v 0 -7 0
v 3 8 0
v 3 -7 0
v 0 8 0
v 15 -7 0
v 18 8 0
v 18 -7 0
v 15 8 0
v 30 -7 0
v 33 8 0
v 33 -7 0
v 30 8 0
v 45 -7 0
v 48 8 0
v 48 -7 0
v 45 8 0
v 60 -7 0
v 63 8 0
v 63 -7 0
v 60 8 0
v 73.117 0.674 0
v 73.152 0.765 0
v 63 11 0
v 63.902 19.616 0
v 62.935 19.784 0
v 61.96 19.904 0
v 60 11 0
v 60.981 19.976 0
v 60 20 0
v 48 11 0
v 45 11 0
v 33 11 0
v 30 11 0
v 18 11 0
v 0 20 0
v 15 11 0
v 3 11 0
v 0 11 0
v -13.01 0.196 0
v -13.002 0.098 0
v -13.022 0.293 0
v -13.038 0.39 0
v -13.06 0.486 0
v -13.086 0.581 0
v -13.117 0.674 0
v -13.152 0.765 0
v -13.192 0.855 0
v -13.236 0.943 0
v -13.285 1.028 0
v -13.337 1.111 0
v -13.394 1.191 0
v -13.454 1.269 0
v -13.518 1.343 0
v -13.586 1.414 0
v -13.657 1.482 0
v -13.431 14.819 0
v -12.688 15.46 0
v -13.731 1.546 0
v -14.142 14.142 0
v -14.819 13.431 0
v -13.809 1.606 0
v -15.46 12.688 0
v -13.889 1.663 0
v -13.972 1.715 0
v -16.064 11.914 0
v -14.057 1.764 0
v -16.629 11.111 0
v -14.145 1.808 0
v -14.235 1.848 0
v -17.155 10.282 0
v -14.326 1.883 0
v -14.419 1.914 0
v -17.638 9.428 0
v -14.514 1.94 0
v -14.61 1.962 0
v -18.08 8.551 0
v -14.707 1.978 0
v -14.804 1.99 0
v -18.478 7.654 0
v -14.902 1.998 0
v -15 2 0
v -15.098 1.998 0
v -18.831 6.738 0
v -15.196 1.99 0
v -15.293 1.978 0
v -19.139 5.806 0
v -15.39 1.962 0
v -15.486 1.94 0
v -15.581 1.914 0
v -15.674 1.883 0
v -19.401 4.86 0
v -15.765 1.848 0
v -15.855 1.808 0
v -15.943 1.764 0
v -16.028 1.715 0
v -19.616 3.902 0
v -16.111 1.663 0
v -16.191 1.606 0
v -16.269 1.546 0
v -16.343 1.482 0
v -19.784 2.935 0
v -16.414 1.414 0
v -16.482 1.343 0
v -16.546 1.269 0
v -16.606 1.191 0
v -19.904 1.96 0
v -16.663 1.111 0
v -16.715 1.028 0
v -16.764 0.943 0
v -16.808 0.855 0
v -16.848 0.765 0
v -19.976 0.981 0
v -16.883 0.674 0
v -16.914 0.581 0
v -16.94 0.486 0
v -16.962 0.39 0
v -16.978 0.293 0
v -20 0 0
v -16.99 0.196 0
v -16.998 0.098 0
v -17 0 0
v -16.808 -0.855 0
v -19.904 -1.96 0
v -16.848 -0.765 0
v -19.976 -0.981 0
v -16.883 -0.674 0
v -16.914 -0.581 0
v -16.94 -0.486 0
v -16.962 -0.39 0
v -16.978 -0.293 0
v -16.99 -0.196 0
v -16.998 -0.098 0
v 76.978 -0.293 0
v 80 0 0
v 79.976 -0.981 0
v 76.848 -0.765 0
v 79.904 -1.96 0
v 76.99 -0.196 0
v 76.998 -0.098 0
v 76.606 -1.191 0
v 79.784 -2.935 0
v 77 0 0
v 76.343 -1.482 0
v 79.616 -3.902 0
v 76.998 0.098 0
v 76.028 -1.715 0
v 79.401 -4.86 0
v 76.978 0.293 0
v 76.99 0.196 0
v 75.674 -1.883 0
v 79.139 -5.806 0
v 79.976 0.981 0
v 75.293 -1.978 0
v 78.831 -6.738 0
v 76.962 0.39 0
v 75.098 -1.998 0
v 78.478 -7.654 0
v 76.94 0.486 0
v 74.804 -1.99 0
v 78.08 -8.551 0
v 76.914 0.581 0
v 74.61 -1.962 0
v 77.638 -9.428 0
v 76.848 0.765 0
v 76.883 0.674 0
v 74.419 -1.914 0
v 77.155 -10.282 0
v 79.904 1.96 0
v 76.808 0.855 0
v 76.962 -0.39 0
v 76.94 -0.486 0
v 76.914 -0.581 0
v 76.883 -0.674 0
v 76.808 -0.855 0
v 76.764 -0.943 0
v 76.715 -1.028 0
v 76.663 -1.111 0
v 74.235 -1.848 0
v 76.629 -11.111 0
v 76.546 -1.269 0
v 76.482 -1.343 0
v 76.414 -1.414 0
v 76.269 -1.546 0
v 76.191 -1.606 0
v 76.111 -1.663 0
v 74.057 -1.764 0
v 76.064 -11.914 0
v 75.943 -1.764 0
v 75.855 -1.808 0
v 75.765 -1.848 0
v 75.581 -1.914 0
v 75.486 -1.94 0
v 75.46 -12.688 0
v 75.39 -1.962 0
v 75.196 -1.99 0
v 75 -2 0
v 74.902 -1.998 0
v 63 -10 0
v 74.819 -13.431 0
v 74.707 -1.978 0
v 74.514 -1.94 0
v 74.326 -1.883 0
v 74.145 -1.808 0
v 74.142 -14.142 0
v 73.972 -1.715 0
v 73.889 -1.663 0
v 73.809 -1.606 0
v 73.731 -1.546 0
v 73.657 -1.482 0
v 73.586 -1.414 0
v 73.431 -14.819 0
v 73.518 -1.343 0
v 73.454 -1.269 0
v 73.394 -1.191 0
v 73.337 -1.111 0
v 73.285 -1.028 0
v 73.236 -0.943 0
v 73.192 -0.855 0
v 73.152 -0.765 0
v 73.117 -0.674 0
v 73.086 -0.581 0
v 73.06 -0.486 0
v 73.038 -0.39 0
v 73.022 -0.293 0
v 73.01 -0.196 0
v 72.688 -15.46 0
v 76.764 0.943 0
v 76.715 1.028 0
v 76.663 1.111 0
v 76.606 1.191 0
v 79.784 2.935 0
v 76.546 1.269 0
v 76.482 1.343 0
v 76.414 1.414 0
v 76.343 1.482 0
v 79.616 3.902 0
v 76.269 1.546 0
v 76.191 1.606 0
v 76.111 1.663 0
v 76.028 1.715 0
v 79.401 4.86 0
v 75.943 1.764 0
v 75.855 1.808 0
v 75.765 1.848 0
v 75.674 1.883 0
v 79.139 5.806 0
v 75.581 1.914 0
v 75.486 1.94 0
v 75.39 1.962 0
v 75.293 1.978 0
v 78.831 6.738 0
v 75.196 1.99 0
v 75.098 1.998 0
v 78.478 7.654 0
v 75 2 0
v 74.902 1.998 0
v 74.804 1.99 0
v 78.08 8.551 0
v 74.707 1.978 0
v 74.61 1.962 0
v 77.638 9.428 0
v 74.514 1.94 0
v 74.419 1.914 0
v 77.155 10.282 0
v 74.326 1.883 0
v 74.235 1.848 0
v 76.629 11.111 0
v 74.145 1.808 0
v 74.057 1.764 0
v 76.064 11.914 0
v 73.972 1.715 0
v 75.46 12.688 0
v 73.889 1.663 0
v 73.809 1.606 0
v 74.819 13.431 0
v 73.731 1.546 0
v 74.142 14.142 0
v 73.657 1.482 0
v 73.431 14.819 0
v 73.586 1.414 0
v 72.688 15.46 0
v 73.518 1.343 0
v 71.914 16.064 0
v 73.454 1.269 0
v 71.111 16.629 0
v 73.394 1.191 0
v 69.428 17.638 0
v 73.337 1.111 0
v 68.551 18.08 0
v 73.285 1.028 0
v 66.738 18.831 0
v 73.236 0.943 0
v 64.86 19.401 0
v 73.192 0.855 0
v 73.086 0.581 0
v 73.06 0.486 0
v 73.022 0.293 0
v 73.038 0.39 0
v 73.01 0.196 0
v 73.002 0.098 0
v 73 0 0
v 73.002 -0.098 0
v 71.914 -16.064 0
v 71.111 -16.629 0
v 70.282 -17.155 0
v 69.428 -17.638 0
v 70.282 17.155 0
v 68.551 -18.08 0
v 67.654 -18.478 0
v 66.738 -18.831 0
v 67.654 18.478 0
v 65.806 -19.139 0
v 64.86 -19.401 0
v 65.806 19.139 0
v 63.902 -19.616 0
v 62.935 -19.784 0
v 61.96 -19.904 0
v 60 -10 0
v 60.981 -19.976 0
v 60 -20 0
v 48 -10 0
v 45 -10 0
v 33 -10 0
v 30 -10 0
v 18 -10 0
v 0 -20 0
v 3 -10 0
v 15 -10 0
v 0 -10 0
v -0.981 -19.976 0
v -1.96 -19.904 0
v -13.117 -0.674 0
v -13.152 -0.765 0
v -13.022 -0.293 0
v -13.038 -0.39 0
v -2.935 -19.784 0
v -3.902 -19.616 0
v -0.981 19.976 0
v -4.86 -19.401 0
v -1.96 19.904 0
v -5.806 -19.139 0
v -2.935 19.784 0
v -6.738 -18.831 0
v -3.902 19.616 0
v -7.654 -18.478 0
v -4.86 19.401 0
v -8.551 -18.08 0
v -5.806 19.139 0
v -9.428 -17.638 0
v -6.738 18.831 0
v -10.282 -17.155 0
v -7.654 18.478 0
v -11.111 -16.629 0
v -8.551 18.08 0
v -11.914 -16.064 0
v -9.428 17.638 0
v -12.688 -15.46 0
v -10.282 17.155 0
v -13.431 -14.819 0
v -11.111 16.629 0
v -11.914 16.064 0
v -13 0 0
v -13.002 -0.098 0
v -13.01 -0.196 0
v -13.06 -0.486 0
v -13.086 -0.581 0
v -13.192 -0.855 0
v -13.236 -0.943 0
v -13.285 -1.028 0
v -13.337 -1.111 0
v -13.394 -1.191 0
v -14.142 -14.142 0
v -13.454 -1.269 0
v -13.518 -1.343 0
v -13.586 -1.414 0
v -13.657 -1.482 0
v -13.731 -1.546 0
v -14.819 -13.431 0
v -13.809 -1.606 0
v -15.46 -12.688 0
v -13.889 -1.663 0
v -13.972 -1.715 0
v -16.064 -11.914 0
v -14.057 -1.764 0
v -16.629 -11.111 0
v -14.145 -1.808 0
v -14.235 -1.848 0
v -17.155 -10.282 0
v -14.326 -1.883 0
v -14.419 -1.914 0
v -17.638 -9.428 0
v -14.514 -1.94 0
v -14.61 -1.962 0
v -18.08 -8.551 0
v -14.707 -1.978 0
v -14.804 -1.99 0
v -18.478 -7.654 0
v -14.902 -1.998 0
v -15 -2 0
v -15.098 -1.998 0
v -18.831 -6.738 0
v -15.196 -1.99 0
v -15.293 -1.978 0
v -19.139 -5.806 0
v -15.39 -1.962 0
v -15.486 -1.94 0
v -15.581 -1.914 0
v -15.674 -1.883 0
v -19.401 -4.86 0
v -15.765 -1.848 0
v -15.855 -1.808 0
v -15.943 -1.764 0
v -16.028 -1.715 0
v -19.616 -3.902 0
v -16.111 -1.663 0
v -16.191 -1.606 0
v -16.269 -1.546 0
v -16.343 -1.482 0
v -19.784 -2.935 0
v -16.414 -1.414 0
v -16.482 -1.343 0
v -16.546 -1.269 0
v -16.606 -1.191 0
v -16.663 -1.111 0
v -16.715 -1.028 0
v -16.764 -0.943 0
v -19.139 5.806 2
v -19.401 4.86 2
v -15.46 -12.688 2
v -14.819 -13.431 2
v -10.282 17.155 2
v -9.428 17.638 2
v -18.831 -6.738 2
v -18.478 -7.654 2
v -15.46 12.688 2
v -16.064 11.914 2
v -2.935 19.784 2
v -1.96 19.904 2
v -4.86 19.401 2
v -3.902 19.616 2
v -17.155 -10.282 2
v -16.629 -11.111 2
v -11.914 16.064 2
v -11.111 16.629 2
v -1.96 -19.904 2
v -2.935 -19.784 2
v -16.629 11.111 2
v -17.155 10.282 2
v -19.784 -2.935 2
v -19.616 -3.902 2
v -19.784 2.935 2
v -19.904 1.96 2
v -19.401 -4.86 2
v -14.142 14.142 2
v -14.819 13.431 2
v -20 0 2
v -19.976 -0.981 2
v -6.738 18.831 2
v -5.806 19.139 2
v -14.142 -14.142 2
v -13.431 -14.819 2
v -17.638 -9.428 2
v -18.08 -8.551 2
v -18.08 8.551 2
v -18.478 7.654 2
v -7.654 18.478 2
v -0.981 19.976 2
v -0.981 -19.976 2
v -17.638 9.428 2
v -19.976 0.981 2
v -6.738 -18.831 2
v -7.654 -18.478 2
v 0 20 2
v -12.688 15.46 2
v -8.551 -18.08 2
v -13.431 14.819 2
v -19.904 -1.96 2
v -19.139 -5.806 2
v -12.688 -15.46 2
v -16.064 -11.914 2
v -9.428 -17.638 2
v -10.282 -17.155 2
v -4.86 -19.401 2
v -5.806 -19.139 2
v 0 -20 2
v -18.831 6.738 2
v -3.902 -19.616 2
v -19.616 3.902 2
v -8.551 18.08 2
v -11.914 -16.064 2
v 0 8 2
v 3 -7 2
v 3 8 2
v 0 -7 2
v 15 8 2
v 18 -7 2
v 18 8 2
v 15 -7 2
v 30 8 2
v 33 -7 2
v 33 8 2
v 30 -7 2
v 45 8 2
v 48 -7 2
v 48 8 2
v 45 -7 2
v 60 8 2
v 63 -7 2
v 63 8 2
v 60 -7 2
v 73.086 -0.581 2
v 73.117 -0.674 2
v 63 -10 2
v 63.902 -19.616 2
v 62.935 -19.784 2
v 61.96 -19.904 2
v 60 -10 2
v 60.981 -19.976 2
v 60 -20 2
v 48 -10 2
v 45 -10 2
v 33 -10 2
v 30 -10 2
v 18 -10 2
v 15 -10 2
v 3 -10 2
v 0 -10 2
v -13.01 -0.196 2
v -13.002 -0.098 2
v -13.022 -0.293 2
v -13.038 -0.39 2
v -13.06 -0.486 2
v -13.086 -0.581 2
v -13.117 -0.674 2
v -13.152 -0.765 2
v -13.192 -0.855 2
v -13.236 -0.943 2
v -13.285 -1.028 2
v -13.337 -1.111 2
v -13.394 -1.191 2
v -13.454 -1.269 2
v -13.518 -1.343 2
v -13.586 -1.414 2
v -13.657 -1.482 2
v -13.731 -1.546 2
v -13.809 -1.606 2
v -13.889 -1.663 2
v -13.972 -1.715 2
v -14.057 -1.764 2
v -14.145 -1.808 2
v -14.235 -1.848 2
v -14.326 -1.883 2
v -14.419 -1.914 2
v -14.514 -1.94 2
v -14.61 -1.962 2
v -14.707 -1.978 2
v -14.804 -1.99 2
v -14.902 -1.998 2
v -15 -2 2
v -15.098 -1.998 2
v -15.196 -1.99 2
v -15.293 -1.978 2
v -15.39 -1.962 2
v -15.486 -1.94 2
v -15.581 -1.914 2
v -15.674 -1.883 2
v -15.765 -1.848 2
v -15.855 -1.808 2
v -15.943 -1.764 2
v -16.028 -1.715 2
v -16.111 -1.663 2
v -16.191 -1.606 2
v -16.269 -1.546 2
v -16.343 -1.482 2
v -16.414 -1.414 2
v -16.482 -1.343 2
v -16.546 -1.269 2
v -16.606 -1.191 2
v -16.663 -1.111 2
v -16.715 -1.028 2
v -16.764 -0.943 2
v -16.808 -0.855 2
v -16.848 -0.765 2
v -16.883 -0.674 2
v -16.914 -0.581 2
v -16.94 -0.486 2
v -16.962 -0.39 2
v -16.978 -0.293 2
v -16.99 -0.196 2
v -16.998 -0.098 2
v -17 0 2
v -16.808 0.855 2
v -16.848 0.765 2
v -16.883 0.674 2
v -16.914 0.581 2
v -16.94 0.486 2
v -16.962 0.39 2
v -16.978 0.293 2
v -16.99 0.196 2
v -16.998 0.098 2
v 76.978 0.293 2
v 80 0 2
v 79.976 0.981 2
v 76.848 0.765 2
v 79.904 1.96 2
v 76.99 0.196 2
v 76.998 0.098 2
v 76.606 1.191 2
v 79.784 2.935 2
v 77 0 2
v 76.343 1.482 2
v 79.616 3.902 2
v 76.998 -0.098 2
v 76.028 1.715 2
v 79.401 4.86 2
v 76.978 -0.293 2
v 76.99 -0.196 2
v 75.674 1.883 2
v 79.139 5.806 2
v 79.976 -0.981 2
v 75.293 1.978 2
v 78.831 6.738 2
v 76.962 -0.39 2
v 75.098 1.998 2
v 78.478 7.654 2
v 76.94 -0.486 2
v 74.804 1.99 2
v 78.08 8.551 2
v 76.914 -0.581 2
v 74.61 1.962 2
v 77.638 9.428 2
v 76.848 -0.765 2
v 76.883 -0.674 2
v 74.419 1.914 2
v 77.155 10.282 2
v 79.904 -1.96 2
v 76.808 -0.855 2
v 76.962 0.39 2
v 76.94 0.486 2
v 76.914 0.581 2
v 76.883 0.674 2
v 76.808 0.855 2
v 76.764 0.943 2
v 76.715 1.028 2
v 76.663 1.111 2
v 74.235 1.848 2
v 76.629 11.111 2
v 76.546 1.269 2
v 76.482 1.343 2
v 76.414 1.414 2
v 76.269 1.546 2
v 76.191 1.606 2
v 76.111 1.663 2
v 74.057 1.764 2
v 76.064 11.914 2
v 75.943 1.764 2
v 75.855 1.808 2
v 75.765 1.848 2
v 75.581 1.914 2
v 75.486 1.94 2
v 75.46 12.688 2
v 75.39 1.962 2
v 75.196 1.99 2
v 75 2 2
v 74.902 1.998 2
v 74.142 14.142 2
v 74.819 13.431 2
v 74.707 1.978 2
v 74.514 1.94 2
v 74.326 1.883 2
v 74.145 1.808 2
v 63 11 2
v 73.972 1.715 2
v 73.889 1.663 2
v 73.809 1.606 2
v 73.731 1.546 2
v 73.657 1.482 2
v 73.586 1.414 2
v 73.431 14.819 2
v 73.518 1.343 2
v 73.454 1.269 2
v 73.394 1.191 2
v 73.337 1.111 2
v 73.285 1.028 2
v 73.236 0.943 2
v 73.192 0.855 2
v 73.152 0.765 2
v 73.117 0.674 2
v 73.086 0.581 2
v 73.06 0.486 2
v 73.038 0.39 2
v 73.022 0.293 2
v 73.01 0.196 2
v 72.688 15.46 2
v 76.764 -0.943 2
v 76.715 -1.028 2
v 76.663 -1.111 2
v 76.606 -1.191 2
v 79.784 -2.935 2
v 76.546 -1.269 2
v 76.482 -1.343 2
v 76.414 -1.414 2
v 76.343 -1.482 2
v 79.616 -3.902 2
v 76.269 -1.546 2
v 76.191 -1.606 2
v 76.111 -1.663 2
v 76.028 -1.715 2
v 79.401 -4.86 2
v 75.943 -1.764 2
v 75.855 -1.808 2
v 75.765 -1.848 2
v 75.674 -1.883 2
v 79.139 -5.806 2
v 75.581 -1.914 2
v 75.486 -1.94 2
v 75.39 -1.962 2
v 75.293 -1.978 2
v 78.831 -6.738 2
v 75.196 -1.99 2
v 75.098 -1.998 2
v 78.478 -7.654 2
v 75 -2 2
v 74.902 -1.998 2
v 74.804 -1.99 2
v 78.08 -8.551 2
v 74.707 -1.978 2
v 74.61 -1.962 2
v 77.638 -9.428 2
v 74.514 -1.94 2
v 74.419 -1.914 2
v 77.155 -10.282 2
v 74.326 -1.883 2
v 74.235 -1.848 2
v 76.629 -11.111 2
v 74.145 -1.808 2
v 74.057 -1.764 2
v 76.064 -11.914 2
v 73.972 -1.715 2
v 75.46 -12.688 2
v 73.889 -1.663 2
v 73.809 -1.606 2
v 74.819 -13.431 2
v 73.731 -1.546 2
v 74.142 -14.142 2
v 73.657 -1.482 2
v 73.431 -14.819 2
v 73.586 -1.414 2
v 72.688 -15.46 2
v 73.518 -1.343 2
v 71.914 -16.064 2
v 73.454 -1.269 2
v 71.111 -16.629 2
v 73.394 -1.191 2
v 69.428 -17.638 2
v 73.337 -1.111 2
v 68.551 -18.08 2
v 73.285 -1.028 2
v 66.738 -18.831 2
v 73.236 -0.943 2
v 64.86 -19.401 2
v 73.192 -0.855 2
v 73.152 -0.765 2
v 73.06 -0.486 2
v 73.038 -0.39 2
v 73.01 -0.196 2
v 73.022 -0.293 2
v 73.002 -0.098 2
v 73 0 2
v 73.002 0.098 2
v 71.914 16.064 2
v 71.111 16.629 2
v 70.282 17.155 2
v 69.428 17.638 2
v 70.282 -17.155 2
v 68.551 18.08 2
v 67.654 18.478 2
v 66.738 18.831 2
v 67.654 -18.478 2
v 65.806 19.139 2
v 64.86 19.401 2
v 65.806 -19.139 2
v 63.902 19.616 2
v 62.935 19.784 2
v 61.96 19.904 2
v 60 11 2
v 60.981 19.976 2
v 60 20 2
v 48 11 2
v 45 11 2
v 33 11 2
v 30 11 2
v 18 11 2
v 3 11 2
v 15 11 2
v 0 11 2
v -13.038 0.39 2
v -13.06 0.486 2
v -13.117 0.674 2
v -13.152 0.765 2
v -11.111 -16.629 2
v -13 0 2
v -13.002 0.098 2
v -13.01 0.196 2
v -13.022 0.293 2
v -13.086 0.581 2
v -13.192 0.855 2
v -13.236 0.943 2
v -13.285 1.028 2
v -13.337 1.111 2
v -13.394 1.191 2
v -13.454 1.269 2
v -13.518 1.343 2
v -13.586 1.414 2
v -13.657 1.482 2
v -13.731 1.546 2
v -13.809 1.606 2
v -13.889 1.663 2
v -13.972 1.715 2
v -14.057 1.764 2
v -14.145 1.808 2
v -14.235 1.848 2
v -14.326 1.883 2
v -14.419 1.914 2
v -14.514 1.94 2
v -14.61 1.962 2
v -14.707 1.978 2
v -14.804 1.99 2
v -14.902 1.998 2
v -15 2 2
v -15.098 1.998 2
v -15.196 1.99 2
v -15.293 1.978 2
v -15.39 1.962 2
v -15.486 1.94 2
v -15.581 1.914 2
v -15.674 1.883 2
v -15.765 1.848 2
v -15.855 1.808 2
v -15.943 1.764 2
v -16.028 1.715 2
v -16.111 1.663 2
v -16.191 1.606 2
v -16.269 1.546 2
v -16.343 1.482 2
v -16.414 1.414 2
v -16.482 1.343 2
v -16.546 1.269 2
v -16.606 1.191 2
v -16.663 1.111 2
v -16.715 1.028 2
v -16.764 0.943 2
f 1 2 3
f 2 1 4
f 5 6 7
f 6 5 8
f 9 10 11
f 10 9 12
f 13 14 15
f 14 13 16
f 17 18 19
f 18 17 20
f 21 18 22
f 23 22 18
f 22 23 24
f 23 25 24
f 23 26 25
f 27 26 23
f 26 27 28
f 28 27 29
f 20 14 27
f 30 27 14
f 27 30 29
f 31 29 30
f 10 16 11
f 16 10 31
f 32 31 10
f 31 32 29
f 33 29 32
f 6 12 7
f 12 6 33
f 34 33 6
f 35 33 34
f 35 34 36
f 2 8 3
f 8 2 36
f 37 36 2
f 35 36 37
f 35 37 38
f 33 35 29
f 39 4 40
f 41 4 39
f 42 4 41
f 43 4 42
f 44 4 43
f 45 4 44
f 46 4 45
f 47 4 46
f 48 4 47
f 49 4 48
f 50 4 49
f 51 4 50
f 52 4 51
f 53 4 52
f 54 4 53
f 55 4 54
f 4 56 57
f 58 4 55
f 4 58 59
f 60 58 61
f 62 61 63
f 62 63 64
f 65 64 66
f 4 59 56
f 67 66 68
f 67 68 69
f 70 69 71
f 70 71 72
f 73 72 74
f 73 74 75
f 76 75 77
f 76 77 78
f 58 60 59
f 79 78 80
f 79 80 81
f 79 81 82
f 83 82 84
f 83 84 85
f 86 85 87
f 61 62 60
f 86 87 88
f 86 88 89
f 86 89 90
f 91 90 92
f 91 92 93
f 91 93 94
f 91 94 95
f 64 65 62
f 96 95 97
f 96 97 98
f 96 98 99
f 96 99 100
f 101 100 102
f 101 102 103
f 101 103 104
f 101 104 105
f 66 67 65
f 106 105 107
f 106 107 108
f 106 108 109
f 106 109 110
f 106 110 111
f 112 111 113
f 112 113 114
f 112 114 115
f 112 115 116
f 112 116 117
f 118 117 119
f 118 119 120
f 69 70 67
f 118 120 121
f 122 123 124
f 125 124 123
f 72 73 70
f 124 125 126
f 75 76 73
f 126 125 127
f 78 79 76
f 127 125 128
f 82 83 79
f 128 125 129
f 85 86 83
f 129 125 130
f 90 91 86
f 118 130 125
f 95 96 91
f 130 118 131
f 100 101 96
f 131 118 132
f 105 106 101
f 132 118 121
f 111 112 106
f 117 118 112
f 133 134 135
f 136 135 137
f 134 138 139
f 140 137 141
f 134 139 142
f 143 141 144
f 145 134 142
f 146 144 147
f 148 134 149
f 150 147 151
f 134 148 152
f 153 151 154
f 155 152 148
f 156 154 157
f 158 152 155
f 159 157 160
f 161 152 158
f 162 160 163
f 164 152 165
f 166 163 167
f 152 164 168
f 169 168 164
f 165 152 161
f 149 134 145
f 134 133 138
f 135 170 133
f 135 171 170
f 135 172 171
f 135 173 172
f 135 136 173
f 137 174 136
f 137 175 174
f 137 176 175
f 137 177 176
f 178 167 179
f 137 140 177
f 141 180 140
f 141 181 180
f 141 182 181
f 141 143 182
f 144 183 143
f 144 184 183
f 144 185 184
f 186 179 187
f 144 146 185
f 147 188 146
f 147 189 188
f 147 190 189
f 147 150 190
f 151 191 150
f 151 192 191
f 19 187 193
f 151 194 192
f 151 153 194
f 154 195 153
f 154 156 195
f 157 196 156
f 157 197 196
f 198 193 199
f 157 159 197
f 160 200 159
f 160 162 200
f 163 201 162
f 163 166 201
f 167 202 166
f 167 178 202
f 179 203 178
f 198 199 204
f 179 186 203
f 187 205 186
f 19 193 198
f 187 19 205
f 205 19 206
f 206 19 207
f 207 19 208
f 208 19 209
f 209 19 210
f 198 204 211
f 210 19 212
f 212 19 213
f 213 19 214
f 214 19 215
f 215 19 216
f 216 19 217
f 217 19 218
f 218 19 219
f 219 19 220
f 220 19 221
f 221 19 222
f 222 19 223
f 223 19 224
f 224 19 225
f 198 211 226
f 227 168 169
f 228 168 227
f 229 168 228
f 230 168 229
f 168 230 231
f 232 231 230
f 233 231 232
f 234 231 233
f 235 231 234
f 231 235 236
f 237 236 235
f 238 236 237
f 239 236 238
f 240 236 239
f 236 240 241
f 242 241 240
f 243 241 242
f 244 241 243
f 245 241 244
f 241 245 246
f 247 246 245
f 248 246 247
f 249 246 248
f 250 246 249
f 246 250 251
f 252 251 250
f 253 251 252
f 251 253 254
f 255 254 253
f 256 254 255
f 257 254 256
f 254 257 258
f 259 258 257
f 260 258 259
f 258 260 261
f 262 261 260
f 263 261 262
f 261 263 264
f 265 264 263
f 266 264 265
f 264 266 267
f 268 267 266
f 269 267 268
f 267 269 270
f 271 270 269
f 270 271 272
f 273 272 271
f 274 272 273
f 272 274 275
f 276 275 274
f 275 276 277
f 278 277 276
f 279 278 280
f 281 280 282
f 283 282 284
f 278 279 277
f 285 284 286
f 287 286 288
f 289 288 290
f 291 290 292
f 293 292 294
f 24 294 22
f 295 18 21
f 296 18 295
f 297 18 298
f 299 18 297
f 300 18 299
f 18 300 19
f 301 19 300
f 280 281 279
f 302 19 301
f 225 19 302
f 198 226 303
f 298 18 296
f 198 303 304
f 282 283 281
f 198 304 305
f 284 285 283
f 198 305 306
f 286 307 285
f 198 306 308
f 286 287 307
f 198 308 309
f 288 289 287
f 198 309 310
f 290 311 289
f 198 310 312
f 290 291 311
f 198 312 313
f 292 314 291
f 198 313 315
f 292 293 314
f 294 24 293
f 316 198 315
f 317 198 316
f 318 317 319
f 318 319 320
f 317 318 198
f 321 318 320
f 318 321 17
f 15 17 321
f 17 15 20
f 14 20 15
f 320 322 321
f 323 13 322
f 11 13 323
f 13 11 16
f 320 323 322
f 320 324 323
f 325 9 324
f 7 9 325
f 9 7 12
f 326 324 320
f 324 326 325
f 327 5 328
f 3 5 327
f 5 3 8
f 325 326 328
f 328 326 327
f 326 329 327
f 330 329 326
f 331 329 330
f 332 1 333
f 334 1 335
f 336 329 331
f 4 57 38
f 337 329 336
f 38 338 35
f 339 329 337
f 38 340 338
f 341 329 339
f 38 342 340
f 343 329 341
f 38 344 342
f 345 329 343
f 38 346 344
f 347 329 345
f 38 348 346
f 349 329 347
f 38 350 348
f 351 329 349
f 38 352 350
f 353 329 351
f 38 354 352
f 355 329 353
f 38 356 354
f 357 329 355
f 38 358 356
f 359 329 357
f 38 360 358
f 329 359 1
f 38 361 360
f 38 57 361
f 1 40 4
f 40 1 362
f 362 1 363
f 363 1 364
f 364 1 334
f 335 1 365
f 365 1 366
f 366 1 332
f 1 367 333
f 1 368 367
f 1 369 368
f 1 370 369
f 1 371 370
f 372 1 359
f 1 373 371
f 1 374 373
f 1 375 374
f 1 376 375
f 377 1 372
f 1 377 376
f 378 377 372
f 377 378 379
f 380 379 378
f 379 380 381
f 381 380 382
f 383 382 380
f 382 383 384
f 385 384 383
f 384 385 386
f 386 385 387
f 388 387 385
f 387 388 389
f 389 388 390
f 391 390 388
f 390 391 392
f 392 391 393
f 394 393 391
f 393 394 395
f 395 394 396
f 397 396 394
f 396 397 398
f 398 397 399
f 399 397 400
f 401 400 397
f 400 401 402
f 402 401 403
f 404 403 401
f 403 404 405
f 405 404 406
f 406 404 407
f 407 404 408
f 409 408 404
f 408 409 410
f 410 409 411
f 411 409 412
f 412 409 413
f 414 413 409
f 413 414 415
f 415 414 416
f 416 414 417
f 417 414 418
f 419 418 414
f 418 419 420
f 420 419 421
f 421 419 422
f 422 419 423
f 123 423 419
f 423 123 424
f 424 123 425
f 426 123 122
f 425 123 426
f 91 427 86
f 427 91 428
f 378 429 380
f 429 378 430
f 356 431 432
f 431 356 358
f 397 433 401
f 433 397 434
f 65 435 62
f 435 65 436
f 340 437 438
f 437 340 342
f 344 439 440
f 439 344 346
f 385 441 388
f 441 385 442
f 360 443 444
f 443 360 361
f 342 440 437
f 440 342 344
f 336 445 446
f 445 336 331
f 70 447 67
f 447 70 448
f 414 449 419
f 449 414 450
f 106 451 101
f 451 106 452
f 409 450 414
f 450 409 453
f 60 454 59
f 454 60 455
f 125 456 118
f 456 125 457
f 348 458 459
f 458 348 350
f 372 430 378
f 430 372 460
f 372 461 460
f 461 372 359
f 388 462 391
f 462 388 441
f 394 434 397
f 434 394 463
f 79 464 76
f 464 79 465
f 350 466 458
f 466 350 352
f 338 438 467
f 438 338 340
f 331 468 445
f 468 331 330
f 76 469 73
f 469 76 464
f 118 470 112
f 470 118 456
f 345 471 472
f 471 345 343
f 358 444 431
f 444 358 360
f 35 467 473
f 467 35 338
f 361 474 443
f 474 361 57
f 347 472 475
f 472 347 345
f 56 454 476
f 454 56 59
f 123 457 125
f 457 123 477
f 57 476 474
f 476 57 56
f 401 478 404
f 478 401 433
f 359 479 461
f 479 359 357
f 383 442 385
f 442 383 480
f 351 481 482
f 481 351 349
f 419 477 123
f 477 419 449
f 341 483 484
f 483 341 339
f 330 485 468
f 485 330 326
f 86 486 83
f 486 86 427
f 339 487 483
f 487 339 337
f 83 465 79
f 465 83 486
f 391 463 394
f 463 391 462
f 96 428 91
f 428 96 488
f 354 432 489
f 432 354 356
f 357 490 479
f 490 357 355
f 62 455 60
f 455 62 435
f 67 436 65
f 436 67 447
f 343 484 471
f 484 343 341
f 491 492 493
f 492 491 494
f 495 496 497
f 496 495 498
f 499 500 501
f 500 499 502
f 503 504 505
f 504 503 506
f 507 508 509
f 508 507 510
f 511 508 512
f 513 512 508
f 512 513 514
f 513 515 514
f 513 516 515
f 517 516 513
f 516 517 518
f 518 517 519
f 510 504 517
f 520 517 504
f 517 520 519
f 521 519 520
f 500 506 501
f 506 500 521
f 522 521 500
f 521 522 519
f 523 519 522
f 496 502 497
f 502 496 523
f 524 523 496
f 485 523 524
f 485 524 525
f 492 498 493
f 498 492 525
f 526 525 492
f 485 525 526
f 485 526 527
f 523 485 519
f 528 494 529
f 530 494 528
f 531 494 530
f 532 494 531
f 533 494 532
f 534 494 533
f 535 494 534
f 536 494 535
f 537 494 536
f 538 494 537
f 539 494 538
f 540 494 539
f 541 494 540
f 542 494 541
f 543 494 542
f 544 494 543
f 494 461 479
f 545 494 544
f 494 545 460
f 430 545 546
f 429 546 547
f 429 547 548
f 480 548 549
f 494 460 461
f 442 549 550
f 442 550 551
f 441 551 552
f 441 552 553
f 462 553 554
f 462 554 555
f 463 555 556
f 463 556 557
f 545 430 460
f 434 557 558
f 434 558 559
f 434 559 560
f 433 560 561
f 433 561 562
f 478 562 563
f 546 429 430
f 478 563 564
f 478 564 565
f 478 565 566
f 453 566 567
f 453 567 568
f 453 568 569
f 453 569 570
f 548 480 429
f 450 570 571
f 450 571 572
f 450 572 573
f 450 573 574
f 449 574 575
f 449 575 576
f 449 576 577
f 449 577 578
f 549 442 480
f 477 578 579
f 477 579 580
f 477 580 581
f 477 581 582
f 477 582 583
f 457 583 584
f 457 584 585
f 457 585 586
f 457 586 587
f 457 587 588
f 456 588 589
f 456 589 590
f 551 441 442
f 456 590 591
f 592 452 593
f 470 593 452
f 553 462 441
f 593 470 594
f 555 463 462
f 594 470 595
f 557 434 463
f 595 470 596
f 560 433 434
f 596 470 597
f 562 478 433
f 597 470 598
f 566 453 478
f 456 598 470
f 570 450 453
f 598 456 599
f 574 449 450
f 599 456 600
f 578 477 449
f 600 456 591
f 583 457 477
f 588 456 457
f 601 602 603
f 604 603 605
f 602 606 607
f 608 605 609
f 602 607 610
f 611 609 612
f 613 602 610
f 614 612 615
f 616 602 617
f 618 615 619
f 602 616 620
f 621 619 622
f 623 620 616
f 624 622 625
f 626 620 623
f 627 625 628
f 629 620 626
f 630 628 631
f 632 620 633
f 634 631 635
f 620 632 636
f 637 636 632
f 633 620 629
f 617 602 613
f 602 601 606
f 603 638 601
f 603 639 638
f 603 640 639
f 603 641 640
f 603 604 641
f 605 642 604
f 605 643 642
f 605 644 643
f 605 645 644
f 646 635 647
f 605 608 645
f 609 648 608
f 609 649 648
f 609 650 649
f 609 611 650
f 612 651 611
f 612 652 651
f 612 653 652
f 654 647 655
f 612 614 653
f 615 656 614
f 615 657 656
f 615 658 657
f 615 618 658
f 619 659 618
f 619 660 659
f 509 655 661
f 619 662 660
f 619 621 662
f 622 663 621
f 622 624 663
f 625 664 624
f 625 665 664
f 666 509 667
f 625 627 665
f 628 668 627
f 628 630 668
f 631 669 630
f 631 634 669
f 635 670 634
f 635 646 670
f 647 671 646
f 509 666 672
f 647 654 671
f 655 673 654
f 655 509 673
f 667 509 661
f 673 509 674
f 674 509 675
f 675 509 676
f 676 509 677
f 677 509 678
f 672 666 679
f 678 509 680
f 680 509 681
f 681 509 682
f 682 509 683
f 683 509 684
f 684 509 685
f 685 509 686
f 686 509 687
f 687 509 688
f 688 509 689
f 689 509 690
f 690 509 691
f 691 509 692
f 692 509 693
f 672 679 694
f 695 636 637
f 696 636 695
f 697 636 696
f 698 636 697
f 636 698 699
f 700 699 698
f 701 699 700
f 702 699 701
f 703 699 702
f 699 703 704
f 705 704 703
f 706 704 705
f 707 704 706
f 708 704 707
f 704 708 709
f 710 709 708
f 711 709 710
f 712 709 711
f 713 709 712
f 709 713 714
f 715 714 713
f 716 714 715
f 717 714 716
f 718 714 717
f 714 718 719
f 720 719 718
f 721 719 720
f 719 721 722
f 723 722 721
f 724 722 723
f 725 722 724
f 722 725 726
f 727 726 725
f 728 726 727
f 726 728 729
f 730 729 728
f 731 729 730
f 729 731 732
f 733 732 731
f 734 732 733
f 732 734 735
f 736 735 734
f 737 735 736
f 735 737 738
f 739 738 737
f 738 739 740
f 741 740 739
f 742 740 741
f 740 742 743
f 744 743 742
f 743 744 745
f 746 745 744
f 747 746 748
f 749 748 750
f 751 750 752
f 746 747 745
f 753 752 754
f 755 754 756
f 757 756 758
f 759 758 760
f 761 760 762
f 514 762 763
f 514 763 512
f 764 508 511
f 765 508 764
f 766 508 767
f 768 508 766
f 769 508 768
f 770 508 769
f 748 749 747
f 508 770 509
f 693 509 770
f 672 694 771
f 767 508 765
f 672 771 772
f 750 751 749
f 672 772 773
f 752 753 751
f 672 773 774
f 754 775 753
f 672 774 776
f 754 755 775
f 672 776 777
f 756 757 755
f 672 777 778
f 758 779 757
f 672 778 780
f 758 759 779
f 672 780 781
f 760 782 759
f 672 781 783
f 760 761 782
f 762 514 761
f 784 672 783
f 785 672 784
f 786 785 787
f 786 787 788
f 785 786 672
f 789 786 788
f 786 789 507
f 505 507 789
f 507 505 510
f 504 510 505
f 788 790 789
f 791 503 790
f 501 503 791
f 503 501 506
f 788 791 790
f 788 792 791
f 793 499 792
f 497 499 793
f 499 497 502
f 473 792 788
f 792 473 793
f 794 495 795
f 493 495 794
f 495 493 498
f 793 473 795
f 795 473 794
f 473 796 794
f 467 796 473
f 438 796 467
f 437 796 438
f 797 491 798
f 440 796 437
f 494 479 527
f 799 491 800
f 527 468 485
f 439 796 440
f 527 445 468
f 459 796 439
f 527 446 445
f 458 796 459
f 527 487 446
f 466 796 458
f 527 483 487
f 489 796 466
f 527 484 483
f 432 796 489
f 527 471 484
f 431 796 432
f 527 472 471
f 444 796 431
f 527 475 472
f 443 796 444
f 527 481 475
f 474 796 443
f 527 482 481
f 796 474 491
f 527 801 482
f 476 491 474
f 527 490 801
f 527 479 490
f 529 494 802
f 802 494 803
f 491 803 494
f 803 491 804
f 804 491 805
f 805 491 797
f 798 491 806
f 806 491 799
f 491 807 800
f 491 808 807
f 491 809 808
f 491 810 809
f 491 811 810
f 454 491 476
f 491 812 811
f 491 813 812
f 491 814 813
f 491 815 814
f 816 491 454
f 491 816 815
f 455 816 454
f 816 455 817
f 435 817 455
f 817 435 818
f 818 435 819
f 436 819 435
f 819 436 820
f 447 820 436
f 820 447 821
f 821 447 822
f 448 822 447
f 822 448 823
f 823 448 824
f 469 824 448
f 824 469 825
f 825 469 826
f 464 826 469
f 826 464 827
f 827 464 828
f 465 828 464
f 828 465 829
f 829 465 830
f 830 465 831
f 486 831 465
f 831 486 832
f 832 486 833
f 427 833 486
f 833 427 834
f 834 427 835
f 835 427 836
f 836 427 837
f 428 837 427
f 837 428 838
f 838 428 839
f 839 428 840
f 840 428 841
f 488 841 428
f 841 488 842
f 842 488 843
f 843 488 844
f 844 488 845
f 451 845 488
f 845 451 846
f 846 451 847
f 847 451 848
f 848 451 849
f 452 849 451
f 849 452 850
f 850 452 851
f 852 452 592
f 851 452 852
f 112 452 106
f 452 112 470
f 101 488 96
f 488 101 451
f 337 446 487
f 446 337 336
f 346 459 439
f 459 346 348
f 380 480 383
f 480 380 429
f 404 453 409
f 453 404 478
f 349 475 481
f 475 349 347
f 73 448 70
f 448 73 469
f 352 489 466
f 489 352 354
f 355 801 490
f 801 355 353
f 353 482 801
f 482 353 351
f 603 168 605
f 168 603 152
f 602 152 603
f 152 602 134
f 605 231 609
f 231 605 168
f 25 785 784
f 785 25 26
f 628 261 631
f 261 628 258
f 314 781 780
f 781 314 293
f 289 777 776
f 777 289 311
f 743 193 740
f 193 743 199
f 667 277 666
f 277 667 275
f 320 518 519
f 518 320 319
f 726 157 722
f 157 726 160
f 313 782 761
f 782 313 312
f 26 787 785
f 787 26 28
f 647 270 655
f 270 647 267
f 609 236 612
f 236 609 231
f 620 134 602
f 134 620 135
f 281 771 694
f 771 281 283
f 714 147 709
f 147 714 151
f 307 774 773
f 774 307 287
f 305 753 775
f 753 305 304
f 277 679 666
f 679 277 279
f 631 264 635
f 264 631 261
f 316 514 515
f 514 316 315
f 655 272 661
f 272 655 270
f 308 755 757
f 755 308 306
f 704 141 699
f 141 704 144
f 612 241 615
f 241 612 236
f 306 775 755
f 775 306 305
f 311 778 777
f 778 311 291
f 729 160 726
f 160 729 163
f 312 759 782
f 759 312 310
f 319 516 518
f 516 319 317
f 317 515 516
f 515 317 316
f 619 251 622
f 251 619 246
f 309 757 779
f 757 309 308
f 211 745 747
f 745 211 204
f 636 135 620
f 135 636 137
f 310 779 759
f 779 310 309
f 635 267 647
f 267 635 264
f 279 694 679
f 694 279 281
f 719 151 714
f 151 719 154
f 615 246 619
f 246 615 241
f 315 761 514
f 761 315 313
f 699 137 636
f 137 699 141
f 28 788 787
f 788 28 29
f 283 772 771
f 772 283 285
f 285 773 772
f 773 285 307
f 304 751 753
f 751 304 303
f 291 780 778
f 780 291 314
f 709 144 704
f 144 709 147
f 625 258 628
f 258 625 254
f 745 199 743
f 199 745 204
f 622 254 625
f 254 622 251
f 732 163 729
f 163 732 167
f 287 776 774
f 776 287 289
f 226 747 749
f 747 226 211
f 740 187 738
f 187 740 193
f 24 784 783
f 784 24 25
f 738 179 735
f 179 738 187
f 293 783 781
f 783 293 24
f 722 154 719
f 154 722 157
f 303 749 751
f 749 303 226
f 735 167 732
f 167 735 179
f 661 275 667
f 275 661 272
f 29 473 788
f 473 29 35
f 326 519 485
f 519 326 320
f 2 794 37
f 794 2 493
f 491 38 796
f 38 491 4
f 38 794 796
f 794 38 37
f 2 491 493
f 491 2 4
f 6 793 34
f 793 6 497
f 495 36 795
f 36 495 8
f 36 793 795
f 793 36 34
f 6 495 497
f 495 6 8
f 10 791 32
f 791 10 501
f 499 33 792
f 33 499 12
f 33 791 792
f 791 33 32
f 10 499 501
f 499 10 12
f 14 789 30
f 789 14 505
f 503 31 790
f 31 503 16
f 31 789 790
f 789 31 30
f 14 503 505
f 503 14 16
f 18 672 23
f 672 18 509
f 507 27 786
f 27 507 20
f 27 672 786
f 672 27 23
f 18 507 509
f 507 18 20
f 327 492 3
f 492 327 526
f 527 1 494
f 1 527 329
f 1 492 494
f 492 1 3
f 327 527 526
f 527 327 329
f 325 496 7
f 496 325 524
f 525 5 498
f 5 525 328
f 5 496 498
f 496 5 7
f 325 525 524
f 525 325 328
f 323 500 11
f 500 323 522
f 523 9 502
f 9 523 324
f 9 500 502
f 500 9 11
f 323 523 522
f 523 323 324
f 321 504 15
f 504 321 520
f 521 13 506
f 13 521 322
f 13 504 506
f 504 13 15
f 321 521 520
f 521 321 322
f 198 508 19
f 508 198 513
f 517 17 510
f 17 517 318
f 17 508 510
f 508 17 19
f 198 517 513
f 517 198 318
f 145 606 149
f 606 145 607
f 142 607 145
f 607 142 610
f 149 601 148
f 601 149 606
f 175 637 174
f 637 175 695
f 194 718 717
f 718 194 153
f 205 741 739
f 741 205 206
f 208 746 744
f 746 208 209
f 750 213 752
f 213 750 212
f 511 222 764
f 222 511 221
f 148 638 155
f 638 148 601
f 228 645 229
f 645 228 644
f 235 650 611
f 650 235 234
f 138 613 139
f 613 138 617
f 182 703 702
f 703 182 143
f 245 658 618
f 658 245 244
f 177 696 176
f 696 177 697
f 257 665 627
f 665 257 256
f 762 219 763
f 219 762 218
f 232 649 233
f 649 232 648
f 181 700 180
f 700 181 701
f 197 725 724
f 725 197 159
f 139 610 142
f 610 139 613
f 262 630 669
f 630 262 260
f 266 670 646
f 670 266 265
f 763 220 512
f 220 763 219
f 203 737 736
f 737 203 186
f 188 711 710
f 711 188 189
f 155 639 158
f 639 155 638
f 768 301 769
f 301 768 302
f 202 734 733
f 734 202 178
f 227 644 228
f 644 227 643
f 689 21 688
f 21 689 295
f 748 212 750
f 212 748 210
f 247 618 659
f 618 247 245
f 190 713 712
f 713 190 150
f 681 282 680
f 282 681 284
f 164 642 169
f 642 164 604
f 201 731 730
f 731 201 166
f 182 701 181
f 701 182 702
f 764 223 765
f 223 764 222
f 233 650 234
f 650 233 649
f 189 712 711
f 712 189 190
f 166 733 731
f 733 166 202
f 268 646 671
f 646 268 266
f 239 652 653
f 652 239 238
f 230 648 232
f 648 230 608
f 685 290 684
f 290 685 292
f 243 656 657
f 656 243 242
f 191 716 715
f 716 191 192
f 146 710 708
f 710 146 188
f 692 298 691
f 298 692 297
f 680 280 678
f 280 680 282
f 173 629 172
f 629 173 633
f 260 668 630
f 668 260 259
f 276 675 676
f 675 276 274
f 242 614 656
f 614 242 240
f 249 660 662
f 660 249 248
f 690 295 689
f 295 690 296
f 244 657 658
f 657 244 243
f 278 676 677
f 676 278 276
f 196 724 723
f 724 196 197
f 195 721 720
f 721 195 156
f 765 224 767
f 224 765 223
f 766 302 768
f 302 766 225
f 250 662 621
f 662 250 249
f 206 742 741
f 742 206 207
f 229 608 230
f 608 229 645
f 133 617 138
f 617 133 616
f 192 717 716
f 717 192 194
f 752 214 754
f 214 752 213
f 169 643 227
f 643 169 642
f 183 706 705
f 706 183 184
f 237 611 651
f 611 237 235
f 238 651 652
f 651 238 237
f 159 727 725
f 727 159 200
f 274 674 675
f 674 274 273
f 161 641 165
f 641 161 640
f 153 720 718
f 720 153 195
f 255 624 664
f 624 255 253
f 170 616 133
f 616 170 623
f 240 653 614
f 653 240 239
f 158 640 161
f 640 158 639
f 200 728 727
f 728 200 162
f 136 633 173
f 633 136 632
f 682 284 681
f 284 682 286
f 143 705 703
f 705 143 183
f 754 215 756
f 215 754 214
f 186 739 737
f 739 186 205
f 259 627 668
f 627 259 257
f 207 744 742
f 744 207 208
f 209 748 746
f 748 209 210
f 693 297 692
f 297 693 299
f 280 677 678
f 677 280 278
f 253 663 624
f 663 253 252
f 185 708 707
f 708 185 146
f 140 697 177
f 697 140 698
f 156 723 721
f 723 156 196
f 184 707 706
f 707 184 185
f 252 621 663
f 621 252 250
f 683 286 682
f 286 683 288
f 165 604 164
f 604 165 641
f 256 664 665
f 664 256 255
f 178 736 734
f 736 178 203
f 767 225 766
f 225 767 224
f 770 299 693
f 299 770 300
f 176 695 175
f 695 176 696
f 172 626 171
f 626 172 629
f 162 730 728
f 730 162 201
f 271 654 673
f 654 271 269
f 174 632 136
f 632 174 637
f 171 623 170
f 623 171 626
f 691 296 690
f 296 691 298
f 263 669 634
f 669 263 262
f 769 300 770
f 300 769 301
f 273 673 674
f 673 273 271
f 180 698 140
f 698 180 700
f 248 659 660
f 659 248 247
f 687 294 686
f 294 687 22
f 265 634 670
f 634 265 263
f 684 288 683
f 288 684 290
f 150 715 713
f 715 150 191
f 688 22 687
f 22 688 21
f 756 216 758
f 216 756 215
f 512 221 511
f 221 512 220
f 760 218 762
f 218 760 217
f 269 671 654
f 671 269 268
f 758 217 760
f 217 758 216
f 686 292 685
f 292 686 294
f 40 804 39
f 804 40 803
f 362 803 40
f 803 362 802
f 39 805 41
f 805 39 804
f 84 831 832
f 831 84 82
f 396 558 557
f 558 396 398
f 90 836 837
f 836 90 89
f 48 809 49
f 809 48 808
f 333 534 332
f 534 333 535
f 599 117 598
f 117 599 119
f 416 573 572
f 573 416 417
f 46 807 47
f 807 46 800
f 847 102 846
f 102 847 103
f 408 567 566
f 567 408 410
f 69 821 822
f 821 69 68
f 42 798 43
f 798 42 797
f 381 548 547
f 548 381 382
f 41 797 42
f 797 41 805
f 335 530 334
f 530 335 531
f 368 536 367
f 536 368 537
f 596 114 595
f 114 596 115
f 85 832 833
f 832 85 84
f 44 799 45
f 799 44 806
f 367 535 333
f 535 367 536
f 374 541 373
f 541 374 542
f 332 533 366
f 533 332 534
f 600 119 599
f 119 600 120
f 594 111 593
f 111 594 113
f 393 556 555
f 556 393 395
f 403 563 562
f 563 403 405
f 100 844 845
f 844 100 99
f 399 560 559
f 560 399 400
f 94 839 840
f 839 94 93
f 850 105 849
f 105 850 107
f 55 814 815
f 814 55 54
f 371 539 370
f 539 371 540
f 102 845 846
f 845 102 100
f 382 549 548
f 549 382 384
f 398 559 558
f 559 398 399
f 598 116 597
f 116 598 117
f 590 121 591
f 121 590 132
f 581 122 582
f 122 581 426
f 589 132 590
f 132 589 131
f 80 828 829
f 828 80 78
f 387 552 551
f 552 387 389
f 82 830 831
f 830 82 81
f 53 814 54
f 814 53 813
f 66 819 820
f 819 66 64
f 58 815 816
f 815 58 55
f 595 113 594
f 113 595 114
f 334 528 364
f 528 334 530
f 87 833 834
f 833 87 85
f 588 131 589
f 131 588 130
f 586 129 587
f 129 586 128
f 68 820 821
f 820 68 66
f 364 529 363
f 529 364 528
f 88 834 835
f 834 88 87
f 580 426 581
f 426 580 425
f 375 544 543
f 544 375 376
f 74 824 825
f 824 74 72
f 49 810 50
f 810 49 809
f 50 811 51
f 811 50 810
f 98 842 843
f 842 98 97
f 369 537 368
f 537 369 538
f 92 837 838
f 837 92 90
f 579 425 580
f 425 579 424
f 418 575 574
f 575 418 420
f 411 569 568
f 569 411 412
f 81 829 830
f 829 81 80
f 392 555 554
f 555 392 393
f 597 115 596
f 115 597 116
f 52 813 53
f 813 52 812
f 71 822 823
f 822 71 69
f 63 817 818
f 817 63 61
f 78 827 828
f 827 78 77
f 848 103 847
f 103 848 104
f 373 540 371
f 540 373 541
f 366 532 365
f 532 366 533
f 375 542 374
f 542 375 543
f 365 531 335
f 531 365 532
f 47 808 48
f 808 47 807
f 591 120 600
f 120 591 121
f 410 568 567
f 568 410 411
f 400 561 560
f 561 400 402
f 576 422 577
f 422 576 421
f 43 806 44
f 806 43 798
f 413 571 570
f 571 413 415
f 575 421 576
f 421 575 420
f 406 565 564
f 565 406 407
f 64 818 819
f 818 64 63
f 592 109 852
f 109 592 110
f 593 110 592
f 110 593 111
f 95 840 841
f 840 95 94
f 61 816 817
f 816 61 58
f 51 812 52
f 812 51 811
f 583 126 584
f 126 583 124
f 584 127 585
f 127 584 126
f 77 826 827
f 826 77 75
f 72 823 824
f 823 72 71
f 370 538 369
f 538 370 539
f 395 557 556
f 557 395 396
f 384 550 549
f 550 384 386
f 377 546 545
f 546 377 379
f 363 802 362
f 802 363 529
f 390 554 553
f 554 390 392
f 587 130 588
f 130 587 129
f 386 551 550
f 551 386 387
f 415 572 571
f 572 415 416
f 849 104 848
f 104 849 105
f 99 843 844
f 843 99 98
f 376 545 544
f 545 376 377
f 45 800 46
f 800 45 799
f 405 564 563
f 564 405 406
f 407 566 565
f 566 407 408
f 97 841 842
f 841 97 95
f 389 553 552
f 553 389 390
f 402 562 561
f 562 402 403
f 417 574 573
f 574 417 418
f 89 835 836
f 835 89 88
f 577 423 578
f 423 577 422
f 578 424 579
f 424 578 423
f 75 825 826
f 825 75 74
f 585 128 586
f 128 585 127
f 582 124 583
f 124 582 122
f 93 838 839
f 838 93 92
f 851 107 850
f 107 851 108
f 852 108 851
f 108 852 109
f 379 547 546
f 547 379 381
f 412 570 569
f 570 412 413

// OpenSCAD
//Maxim Logunchov 22.11.2013.
$fn=128;

difference(c) {

//Основа
union(a){
cylinder(2,20,20);
translate([60,0,0])cylinder(2,20,20);
translate([0,-20,0])cube([60,40,2]);
}
//Отверстия для магнитов
union(b){
translate([0,8,0])cube(3,5,5);
translate([15,8,0])cube(3,5,5);
translate([30,8,0])cube(3,5,5);
translate([45,8,0])cube(3,5,5);
translate([60,8,0])cube(3,5,5);
translate([0,-10,0])cube(3,5,5);
translate([15,-10,0])cube(3,5,5);
translate([30,-10,0])cube(3,5,5);
translate([45,-10,0])cube(3,5,5);
translate([60,-10,0])cube(3,5,5);
}
//Отверстия для вставки
translate([75,0,0])cylinder(6,2,2);
translate([-15,0,0])cylinder(6,2,2);
}
